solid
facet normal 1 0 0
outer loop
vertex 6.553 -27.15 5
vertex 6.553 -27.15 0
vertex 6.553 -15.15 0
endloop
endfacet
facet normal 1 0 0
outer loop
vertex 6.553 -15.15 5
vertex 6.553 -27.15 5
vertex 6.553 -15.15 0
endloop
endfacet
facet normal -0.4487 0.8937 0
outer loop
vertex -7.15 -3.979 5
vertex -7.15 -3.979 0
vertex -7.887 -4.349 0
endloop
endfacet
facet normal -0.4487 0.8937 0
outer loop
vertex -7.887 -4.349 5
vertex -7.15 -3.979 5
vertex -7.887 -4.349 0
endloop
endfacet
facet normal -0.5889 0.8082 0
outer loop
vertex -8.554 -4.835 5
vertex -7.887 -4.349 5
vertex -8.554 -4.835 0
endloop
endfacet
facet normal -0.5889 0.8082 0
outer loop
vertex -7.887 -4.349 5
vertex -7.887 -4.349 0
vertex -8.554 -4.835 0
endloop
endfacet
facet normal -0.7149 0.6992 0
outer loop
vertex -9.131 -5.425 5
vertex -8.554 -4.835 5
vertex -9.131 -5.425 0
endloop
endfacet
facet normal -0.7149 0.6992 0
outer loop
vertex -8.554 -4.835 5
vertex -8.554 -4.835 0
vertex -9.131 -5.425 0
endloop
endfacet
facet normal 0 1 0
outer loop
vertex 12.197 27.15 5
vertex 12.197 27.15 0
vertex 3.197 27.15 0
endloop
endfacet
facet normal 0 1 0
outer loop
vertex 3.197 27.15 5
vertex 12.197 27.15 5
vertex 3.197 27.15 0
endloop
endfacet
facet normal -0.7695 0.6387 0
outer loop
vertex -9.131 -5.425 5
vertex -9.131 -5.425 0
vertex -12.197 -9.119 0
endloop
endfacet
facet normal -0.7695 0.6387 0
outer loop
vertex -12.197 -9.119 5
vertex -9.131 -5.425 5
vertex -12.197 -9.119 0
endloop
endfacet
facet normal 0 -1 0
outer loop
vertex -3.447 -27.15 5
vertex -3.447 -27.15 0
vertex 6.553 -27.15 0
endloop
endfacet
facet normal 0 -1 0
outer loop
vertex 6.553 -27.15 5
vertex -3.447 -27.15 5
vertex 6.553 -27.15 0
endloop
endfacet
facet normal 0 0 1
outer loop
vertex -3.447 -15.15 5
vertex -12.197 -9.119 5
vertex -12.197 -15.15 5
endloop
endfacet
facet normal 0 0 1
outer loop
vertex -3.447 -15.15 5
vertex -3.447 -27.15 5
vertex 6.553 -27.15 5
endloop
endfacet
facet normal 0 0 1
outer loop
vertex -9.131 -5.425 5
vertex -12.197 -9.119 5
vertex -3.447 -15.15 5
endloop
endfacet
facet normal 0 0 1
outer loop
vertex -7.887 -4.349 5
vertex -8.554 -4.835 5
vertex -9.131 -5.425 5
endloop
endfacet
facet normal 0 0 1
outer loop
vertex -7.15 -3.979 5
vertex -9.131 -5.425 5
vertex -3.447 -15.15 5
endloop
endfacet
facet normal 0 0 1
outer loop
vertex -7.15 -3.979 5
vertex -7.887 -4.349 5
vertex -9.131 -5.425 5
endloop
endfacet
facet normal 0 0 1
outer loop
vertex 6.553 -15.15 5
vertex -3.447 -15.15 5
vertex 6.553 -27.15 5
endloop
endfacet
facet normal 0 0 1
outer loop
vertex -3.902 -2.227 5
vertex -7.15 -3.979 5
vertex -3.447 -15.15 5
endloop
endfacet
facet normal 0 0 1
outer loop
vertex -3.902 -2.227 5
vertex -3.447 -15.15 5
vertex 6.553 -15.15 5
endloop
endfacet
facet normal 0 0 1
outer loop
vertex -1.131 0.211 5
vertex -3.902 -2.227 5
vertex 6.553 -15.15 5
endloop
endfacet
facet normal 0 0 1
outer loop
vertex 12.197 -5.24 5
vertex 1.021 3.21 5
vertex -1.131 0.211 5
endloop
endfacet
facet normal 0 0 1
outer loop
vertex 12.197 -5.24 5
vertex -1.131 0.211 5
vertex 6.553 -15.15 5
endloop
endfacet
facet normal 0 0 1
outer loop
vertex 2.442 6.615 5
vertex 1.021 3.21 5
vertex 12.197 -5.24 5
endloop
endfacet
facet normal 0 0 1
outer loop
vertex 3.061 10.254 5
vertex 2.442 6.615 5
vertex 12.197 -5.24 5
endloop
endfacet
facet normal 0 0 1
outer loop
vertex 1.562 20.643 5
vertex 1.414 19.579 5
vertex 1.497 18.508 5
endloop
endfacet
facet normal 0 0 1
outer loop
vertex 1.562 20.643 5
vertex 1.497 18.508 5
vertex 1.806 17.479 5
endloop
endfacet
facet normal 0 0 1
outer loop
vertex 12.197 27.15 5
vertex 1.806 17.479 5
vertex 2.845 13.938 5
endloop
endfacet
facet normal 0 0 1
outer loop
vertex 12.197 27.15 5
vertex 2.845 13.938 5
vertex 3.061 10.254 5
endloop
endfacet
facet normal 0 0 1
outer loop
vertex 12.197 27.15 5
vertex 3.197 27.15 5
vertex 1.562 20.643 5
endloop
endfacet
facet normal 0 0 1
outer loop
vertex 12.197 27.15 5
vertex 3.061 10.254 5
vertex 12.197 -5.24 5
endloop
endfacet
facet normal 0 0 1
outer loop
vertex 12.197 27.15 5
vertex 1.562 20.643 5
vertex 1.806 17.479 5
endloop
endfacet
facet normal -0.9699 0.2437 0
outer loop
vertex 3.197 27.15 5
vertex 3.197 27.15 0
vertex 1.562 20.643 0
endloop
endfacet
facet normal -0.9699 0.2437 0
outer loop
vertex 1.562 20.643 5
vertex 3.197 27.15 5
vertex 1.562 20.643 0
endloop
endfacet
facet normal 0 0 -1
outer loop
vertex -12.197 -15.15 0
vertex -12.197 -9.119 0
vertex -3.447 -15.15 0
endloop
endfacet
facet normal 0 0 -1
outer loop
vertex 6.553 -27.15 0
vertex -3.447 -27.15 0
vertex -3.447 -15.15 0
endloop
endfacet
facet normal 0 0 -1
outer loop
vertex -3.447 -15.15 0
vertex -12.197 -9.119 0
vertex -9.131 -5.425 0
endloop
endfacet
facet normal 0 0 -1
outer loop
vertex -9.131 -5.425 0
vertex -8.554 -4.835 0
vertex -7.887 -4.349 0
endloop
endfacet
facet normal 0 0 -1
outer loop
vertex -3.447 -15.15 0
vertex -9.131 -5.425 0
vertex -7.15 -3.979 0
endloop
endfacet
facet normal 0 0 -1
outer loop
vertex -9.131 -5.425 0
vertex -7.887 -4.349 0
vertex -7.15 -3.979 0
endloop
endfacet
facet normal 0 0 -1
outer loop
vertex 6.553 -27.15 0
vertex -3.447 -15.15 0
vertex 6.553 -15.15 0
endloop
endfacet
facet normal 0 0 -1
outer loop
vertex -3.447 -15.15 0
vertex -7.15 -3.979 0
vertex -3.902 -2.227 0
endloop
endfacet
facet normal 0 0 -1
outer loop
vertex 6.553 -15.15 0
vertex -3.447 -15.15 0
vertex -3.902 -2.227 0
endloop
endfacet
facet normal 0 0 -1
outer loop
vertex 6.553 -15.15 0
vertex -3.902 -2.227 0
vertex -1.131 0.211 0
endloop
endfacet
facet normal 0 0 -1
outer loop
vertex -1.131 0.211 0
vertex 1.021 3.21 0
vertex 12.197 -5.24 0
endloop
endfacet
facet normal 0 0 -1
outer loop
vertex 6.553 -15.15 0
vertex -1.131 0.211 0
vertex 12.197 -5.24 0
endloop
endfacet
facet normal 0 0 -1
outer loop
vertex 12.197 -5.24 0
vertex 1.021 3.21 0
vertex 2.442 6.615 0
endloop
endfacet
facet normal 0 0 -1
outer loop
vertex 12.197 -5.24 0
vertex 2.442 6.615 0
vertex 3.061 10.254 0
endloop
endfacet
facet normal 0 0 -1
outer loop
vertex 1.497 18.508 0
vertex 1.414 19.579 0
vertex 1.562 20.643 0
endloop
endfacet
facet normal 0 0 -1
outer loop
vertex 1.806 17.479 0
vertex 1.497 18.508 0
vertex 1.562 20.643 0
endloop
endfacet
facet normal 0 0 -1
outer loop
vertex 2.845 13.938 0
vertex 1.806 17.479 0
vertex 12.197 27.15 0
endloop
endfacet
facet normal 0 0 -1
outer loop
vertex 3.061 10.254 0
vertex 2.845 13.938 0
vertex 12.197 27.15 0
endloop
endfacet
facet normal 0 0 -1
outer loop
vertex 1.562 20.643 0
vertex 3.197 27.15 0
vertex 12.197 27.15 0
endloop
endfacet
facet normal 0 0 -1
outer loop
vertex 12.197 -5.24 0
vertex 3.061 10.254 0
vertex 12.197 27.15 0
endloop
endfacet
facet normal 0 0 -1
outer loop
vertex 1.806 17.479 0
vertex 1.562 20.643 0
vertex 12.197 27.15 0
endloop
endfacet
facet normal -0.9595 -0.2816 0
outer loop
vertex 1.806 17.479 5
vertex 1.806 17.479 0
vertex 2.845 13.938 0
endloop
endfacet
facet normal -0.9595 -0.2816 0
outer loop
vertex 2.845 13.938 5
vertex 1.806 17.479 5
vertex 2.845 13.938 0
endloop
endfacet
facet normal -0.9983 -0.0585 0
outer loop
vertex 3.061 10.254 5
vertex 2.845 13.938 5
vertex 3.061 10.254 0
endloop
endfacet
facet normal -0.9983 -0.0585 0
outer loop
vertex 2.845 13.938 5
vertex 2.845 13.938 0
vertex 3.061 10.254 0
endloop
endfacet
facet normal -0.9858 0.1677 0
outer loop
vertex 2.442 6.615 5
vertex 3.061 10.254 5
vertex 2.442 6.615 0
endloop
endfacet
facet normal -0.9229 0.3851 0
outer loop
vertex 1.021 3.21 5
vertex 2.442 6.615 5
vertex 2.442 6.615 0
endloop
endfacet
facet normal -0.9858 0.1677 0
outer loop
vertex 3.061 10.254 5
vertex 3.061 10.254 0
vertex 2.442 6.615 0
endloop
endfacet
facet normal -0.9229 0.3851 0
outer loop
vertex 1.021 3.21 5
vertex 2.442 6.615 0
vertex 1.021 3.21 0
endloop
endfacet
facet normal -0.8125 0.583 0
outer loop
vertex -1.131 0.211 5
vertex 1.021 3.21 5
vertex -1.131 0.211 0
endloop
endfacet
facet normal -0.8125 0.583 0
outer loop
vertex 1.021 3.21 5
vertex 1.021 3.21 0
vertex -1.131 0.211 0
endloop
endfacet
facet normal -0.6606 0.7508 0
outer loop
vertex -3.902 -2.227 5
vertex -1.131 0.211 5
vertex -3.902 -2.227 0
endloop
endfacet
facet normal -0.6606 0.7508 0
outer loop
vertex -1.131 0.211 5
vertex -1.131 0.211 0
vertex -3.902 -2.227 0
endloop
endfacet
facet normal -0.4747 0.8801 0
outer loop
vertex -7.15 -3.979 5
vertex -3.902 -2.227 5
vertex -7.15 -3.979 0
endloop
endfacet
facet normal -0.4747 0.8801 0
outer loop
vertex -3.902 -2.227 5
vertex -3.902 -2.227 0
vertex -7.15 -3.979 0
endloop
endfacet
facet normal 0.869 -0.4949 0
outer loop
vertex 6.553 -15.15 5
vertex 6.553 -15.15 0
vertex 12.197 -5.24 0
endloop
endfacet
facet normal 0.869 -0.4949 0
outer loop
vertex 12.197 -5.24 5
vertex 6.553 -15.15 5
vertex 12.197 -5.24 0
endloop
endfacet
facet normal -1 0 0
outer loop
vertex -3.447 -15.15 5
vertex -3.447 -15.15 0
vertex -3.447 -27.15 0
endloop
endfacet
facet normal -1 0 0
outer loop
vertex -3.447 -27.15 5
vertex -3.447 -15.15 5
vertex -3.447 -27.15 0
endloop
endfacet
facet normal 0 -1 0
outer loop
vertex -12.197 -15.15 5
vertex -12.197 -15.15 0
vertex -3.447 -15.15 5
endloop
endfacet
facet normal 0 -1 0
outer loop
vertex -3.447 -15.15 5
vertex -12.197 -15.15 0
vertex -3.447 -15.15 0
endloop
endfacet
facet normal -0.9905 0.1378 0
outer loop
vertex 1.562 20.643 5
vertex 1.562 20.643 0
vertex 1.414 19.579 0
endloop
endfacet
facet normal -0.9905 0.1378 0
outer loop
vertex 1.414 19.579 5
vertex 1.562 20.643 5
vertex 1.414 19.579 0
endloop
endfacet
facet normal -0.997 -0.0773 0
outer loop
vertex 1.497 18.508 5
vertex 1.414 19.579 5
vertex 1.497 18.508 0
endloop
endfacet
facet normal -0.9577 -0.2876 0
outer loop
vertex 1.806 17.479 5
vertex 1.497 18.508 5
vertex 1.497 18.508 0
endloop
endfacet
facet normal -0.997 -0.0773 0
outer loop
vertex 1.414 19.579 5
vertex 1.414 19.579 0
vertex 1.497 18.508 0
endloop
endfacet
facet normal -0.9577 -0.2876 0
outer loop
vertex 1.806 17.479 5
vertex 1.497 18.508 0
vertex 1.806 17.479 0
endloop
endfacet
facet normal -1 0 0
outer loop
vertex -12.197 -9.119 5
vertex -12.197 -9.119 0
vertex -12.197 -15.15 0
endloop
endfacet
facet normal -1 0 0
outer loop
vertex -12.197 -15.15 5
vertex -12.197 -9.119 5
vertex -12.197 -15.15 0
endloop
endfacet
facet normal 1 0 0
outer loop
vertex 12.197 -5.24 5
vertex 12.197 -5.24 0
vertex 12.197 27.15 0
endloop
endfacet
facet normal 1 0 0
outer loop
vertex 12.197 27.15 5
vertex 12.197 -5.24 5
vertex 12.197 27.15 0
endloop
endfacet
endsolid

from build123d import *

# Parameters (mm, degrees)
F1_DEPTH = 5


# Not quite as in the source:
# - ends of sketch curves that miss each other by under 0.0002 mm in the source are joined


with BuildPart() as f1:
    # F0 (on Top) → F1 (new body)
    with BuildSketch(Plane.XY):
        with BuildLine():
            ThreePointArc((1.8058852177, 17.4790926703), (1.8279530148, 4.8720604744), (-7.149820085, -3.9787777878))
            ThreePointArc((-7.149820085, -3.9787777878), (-8.2306223723, -4.5782907715), (-9.1313488192, -5.4246011501))
            Line((-9.1313488192, -5.4246011501), (-12.197101, -9.119353))
            Line((-12.197101, -9.119353), (-12.197101, -15.150279))
            Line((-12.197101, -15.150279), (-3.447101, -15.150279))
            Line((-3.447101, -15.150279), (-3.447101, -27.150279))
            Line((-3.447101, -27.150279), (6.552899, -27.150279))
            Line((6.552899, -27.150279), (6.552899, -15.150279))
            Line((6.552899, -15.150279), (12.197102, -5.240307))
            Line((12.197102, -5.240307), (12.197102, 27.150279))
            Line((12.197102, 27.150279), (3.197102, 27.150279))
            Line((3.197102, 27.150279), (1.562377, 20.643277))
            ThreePointArc((1.562377, 20.643277), (1.4264287194, 19.0413526341), (1.8058852177, 17.4790926703))
        make_face()
    extrude(amount=F1_DEPTH)


solid = f1.part
